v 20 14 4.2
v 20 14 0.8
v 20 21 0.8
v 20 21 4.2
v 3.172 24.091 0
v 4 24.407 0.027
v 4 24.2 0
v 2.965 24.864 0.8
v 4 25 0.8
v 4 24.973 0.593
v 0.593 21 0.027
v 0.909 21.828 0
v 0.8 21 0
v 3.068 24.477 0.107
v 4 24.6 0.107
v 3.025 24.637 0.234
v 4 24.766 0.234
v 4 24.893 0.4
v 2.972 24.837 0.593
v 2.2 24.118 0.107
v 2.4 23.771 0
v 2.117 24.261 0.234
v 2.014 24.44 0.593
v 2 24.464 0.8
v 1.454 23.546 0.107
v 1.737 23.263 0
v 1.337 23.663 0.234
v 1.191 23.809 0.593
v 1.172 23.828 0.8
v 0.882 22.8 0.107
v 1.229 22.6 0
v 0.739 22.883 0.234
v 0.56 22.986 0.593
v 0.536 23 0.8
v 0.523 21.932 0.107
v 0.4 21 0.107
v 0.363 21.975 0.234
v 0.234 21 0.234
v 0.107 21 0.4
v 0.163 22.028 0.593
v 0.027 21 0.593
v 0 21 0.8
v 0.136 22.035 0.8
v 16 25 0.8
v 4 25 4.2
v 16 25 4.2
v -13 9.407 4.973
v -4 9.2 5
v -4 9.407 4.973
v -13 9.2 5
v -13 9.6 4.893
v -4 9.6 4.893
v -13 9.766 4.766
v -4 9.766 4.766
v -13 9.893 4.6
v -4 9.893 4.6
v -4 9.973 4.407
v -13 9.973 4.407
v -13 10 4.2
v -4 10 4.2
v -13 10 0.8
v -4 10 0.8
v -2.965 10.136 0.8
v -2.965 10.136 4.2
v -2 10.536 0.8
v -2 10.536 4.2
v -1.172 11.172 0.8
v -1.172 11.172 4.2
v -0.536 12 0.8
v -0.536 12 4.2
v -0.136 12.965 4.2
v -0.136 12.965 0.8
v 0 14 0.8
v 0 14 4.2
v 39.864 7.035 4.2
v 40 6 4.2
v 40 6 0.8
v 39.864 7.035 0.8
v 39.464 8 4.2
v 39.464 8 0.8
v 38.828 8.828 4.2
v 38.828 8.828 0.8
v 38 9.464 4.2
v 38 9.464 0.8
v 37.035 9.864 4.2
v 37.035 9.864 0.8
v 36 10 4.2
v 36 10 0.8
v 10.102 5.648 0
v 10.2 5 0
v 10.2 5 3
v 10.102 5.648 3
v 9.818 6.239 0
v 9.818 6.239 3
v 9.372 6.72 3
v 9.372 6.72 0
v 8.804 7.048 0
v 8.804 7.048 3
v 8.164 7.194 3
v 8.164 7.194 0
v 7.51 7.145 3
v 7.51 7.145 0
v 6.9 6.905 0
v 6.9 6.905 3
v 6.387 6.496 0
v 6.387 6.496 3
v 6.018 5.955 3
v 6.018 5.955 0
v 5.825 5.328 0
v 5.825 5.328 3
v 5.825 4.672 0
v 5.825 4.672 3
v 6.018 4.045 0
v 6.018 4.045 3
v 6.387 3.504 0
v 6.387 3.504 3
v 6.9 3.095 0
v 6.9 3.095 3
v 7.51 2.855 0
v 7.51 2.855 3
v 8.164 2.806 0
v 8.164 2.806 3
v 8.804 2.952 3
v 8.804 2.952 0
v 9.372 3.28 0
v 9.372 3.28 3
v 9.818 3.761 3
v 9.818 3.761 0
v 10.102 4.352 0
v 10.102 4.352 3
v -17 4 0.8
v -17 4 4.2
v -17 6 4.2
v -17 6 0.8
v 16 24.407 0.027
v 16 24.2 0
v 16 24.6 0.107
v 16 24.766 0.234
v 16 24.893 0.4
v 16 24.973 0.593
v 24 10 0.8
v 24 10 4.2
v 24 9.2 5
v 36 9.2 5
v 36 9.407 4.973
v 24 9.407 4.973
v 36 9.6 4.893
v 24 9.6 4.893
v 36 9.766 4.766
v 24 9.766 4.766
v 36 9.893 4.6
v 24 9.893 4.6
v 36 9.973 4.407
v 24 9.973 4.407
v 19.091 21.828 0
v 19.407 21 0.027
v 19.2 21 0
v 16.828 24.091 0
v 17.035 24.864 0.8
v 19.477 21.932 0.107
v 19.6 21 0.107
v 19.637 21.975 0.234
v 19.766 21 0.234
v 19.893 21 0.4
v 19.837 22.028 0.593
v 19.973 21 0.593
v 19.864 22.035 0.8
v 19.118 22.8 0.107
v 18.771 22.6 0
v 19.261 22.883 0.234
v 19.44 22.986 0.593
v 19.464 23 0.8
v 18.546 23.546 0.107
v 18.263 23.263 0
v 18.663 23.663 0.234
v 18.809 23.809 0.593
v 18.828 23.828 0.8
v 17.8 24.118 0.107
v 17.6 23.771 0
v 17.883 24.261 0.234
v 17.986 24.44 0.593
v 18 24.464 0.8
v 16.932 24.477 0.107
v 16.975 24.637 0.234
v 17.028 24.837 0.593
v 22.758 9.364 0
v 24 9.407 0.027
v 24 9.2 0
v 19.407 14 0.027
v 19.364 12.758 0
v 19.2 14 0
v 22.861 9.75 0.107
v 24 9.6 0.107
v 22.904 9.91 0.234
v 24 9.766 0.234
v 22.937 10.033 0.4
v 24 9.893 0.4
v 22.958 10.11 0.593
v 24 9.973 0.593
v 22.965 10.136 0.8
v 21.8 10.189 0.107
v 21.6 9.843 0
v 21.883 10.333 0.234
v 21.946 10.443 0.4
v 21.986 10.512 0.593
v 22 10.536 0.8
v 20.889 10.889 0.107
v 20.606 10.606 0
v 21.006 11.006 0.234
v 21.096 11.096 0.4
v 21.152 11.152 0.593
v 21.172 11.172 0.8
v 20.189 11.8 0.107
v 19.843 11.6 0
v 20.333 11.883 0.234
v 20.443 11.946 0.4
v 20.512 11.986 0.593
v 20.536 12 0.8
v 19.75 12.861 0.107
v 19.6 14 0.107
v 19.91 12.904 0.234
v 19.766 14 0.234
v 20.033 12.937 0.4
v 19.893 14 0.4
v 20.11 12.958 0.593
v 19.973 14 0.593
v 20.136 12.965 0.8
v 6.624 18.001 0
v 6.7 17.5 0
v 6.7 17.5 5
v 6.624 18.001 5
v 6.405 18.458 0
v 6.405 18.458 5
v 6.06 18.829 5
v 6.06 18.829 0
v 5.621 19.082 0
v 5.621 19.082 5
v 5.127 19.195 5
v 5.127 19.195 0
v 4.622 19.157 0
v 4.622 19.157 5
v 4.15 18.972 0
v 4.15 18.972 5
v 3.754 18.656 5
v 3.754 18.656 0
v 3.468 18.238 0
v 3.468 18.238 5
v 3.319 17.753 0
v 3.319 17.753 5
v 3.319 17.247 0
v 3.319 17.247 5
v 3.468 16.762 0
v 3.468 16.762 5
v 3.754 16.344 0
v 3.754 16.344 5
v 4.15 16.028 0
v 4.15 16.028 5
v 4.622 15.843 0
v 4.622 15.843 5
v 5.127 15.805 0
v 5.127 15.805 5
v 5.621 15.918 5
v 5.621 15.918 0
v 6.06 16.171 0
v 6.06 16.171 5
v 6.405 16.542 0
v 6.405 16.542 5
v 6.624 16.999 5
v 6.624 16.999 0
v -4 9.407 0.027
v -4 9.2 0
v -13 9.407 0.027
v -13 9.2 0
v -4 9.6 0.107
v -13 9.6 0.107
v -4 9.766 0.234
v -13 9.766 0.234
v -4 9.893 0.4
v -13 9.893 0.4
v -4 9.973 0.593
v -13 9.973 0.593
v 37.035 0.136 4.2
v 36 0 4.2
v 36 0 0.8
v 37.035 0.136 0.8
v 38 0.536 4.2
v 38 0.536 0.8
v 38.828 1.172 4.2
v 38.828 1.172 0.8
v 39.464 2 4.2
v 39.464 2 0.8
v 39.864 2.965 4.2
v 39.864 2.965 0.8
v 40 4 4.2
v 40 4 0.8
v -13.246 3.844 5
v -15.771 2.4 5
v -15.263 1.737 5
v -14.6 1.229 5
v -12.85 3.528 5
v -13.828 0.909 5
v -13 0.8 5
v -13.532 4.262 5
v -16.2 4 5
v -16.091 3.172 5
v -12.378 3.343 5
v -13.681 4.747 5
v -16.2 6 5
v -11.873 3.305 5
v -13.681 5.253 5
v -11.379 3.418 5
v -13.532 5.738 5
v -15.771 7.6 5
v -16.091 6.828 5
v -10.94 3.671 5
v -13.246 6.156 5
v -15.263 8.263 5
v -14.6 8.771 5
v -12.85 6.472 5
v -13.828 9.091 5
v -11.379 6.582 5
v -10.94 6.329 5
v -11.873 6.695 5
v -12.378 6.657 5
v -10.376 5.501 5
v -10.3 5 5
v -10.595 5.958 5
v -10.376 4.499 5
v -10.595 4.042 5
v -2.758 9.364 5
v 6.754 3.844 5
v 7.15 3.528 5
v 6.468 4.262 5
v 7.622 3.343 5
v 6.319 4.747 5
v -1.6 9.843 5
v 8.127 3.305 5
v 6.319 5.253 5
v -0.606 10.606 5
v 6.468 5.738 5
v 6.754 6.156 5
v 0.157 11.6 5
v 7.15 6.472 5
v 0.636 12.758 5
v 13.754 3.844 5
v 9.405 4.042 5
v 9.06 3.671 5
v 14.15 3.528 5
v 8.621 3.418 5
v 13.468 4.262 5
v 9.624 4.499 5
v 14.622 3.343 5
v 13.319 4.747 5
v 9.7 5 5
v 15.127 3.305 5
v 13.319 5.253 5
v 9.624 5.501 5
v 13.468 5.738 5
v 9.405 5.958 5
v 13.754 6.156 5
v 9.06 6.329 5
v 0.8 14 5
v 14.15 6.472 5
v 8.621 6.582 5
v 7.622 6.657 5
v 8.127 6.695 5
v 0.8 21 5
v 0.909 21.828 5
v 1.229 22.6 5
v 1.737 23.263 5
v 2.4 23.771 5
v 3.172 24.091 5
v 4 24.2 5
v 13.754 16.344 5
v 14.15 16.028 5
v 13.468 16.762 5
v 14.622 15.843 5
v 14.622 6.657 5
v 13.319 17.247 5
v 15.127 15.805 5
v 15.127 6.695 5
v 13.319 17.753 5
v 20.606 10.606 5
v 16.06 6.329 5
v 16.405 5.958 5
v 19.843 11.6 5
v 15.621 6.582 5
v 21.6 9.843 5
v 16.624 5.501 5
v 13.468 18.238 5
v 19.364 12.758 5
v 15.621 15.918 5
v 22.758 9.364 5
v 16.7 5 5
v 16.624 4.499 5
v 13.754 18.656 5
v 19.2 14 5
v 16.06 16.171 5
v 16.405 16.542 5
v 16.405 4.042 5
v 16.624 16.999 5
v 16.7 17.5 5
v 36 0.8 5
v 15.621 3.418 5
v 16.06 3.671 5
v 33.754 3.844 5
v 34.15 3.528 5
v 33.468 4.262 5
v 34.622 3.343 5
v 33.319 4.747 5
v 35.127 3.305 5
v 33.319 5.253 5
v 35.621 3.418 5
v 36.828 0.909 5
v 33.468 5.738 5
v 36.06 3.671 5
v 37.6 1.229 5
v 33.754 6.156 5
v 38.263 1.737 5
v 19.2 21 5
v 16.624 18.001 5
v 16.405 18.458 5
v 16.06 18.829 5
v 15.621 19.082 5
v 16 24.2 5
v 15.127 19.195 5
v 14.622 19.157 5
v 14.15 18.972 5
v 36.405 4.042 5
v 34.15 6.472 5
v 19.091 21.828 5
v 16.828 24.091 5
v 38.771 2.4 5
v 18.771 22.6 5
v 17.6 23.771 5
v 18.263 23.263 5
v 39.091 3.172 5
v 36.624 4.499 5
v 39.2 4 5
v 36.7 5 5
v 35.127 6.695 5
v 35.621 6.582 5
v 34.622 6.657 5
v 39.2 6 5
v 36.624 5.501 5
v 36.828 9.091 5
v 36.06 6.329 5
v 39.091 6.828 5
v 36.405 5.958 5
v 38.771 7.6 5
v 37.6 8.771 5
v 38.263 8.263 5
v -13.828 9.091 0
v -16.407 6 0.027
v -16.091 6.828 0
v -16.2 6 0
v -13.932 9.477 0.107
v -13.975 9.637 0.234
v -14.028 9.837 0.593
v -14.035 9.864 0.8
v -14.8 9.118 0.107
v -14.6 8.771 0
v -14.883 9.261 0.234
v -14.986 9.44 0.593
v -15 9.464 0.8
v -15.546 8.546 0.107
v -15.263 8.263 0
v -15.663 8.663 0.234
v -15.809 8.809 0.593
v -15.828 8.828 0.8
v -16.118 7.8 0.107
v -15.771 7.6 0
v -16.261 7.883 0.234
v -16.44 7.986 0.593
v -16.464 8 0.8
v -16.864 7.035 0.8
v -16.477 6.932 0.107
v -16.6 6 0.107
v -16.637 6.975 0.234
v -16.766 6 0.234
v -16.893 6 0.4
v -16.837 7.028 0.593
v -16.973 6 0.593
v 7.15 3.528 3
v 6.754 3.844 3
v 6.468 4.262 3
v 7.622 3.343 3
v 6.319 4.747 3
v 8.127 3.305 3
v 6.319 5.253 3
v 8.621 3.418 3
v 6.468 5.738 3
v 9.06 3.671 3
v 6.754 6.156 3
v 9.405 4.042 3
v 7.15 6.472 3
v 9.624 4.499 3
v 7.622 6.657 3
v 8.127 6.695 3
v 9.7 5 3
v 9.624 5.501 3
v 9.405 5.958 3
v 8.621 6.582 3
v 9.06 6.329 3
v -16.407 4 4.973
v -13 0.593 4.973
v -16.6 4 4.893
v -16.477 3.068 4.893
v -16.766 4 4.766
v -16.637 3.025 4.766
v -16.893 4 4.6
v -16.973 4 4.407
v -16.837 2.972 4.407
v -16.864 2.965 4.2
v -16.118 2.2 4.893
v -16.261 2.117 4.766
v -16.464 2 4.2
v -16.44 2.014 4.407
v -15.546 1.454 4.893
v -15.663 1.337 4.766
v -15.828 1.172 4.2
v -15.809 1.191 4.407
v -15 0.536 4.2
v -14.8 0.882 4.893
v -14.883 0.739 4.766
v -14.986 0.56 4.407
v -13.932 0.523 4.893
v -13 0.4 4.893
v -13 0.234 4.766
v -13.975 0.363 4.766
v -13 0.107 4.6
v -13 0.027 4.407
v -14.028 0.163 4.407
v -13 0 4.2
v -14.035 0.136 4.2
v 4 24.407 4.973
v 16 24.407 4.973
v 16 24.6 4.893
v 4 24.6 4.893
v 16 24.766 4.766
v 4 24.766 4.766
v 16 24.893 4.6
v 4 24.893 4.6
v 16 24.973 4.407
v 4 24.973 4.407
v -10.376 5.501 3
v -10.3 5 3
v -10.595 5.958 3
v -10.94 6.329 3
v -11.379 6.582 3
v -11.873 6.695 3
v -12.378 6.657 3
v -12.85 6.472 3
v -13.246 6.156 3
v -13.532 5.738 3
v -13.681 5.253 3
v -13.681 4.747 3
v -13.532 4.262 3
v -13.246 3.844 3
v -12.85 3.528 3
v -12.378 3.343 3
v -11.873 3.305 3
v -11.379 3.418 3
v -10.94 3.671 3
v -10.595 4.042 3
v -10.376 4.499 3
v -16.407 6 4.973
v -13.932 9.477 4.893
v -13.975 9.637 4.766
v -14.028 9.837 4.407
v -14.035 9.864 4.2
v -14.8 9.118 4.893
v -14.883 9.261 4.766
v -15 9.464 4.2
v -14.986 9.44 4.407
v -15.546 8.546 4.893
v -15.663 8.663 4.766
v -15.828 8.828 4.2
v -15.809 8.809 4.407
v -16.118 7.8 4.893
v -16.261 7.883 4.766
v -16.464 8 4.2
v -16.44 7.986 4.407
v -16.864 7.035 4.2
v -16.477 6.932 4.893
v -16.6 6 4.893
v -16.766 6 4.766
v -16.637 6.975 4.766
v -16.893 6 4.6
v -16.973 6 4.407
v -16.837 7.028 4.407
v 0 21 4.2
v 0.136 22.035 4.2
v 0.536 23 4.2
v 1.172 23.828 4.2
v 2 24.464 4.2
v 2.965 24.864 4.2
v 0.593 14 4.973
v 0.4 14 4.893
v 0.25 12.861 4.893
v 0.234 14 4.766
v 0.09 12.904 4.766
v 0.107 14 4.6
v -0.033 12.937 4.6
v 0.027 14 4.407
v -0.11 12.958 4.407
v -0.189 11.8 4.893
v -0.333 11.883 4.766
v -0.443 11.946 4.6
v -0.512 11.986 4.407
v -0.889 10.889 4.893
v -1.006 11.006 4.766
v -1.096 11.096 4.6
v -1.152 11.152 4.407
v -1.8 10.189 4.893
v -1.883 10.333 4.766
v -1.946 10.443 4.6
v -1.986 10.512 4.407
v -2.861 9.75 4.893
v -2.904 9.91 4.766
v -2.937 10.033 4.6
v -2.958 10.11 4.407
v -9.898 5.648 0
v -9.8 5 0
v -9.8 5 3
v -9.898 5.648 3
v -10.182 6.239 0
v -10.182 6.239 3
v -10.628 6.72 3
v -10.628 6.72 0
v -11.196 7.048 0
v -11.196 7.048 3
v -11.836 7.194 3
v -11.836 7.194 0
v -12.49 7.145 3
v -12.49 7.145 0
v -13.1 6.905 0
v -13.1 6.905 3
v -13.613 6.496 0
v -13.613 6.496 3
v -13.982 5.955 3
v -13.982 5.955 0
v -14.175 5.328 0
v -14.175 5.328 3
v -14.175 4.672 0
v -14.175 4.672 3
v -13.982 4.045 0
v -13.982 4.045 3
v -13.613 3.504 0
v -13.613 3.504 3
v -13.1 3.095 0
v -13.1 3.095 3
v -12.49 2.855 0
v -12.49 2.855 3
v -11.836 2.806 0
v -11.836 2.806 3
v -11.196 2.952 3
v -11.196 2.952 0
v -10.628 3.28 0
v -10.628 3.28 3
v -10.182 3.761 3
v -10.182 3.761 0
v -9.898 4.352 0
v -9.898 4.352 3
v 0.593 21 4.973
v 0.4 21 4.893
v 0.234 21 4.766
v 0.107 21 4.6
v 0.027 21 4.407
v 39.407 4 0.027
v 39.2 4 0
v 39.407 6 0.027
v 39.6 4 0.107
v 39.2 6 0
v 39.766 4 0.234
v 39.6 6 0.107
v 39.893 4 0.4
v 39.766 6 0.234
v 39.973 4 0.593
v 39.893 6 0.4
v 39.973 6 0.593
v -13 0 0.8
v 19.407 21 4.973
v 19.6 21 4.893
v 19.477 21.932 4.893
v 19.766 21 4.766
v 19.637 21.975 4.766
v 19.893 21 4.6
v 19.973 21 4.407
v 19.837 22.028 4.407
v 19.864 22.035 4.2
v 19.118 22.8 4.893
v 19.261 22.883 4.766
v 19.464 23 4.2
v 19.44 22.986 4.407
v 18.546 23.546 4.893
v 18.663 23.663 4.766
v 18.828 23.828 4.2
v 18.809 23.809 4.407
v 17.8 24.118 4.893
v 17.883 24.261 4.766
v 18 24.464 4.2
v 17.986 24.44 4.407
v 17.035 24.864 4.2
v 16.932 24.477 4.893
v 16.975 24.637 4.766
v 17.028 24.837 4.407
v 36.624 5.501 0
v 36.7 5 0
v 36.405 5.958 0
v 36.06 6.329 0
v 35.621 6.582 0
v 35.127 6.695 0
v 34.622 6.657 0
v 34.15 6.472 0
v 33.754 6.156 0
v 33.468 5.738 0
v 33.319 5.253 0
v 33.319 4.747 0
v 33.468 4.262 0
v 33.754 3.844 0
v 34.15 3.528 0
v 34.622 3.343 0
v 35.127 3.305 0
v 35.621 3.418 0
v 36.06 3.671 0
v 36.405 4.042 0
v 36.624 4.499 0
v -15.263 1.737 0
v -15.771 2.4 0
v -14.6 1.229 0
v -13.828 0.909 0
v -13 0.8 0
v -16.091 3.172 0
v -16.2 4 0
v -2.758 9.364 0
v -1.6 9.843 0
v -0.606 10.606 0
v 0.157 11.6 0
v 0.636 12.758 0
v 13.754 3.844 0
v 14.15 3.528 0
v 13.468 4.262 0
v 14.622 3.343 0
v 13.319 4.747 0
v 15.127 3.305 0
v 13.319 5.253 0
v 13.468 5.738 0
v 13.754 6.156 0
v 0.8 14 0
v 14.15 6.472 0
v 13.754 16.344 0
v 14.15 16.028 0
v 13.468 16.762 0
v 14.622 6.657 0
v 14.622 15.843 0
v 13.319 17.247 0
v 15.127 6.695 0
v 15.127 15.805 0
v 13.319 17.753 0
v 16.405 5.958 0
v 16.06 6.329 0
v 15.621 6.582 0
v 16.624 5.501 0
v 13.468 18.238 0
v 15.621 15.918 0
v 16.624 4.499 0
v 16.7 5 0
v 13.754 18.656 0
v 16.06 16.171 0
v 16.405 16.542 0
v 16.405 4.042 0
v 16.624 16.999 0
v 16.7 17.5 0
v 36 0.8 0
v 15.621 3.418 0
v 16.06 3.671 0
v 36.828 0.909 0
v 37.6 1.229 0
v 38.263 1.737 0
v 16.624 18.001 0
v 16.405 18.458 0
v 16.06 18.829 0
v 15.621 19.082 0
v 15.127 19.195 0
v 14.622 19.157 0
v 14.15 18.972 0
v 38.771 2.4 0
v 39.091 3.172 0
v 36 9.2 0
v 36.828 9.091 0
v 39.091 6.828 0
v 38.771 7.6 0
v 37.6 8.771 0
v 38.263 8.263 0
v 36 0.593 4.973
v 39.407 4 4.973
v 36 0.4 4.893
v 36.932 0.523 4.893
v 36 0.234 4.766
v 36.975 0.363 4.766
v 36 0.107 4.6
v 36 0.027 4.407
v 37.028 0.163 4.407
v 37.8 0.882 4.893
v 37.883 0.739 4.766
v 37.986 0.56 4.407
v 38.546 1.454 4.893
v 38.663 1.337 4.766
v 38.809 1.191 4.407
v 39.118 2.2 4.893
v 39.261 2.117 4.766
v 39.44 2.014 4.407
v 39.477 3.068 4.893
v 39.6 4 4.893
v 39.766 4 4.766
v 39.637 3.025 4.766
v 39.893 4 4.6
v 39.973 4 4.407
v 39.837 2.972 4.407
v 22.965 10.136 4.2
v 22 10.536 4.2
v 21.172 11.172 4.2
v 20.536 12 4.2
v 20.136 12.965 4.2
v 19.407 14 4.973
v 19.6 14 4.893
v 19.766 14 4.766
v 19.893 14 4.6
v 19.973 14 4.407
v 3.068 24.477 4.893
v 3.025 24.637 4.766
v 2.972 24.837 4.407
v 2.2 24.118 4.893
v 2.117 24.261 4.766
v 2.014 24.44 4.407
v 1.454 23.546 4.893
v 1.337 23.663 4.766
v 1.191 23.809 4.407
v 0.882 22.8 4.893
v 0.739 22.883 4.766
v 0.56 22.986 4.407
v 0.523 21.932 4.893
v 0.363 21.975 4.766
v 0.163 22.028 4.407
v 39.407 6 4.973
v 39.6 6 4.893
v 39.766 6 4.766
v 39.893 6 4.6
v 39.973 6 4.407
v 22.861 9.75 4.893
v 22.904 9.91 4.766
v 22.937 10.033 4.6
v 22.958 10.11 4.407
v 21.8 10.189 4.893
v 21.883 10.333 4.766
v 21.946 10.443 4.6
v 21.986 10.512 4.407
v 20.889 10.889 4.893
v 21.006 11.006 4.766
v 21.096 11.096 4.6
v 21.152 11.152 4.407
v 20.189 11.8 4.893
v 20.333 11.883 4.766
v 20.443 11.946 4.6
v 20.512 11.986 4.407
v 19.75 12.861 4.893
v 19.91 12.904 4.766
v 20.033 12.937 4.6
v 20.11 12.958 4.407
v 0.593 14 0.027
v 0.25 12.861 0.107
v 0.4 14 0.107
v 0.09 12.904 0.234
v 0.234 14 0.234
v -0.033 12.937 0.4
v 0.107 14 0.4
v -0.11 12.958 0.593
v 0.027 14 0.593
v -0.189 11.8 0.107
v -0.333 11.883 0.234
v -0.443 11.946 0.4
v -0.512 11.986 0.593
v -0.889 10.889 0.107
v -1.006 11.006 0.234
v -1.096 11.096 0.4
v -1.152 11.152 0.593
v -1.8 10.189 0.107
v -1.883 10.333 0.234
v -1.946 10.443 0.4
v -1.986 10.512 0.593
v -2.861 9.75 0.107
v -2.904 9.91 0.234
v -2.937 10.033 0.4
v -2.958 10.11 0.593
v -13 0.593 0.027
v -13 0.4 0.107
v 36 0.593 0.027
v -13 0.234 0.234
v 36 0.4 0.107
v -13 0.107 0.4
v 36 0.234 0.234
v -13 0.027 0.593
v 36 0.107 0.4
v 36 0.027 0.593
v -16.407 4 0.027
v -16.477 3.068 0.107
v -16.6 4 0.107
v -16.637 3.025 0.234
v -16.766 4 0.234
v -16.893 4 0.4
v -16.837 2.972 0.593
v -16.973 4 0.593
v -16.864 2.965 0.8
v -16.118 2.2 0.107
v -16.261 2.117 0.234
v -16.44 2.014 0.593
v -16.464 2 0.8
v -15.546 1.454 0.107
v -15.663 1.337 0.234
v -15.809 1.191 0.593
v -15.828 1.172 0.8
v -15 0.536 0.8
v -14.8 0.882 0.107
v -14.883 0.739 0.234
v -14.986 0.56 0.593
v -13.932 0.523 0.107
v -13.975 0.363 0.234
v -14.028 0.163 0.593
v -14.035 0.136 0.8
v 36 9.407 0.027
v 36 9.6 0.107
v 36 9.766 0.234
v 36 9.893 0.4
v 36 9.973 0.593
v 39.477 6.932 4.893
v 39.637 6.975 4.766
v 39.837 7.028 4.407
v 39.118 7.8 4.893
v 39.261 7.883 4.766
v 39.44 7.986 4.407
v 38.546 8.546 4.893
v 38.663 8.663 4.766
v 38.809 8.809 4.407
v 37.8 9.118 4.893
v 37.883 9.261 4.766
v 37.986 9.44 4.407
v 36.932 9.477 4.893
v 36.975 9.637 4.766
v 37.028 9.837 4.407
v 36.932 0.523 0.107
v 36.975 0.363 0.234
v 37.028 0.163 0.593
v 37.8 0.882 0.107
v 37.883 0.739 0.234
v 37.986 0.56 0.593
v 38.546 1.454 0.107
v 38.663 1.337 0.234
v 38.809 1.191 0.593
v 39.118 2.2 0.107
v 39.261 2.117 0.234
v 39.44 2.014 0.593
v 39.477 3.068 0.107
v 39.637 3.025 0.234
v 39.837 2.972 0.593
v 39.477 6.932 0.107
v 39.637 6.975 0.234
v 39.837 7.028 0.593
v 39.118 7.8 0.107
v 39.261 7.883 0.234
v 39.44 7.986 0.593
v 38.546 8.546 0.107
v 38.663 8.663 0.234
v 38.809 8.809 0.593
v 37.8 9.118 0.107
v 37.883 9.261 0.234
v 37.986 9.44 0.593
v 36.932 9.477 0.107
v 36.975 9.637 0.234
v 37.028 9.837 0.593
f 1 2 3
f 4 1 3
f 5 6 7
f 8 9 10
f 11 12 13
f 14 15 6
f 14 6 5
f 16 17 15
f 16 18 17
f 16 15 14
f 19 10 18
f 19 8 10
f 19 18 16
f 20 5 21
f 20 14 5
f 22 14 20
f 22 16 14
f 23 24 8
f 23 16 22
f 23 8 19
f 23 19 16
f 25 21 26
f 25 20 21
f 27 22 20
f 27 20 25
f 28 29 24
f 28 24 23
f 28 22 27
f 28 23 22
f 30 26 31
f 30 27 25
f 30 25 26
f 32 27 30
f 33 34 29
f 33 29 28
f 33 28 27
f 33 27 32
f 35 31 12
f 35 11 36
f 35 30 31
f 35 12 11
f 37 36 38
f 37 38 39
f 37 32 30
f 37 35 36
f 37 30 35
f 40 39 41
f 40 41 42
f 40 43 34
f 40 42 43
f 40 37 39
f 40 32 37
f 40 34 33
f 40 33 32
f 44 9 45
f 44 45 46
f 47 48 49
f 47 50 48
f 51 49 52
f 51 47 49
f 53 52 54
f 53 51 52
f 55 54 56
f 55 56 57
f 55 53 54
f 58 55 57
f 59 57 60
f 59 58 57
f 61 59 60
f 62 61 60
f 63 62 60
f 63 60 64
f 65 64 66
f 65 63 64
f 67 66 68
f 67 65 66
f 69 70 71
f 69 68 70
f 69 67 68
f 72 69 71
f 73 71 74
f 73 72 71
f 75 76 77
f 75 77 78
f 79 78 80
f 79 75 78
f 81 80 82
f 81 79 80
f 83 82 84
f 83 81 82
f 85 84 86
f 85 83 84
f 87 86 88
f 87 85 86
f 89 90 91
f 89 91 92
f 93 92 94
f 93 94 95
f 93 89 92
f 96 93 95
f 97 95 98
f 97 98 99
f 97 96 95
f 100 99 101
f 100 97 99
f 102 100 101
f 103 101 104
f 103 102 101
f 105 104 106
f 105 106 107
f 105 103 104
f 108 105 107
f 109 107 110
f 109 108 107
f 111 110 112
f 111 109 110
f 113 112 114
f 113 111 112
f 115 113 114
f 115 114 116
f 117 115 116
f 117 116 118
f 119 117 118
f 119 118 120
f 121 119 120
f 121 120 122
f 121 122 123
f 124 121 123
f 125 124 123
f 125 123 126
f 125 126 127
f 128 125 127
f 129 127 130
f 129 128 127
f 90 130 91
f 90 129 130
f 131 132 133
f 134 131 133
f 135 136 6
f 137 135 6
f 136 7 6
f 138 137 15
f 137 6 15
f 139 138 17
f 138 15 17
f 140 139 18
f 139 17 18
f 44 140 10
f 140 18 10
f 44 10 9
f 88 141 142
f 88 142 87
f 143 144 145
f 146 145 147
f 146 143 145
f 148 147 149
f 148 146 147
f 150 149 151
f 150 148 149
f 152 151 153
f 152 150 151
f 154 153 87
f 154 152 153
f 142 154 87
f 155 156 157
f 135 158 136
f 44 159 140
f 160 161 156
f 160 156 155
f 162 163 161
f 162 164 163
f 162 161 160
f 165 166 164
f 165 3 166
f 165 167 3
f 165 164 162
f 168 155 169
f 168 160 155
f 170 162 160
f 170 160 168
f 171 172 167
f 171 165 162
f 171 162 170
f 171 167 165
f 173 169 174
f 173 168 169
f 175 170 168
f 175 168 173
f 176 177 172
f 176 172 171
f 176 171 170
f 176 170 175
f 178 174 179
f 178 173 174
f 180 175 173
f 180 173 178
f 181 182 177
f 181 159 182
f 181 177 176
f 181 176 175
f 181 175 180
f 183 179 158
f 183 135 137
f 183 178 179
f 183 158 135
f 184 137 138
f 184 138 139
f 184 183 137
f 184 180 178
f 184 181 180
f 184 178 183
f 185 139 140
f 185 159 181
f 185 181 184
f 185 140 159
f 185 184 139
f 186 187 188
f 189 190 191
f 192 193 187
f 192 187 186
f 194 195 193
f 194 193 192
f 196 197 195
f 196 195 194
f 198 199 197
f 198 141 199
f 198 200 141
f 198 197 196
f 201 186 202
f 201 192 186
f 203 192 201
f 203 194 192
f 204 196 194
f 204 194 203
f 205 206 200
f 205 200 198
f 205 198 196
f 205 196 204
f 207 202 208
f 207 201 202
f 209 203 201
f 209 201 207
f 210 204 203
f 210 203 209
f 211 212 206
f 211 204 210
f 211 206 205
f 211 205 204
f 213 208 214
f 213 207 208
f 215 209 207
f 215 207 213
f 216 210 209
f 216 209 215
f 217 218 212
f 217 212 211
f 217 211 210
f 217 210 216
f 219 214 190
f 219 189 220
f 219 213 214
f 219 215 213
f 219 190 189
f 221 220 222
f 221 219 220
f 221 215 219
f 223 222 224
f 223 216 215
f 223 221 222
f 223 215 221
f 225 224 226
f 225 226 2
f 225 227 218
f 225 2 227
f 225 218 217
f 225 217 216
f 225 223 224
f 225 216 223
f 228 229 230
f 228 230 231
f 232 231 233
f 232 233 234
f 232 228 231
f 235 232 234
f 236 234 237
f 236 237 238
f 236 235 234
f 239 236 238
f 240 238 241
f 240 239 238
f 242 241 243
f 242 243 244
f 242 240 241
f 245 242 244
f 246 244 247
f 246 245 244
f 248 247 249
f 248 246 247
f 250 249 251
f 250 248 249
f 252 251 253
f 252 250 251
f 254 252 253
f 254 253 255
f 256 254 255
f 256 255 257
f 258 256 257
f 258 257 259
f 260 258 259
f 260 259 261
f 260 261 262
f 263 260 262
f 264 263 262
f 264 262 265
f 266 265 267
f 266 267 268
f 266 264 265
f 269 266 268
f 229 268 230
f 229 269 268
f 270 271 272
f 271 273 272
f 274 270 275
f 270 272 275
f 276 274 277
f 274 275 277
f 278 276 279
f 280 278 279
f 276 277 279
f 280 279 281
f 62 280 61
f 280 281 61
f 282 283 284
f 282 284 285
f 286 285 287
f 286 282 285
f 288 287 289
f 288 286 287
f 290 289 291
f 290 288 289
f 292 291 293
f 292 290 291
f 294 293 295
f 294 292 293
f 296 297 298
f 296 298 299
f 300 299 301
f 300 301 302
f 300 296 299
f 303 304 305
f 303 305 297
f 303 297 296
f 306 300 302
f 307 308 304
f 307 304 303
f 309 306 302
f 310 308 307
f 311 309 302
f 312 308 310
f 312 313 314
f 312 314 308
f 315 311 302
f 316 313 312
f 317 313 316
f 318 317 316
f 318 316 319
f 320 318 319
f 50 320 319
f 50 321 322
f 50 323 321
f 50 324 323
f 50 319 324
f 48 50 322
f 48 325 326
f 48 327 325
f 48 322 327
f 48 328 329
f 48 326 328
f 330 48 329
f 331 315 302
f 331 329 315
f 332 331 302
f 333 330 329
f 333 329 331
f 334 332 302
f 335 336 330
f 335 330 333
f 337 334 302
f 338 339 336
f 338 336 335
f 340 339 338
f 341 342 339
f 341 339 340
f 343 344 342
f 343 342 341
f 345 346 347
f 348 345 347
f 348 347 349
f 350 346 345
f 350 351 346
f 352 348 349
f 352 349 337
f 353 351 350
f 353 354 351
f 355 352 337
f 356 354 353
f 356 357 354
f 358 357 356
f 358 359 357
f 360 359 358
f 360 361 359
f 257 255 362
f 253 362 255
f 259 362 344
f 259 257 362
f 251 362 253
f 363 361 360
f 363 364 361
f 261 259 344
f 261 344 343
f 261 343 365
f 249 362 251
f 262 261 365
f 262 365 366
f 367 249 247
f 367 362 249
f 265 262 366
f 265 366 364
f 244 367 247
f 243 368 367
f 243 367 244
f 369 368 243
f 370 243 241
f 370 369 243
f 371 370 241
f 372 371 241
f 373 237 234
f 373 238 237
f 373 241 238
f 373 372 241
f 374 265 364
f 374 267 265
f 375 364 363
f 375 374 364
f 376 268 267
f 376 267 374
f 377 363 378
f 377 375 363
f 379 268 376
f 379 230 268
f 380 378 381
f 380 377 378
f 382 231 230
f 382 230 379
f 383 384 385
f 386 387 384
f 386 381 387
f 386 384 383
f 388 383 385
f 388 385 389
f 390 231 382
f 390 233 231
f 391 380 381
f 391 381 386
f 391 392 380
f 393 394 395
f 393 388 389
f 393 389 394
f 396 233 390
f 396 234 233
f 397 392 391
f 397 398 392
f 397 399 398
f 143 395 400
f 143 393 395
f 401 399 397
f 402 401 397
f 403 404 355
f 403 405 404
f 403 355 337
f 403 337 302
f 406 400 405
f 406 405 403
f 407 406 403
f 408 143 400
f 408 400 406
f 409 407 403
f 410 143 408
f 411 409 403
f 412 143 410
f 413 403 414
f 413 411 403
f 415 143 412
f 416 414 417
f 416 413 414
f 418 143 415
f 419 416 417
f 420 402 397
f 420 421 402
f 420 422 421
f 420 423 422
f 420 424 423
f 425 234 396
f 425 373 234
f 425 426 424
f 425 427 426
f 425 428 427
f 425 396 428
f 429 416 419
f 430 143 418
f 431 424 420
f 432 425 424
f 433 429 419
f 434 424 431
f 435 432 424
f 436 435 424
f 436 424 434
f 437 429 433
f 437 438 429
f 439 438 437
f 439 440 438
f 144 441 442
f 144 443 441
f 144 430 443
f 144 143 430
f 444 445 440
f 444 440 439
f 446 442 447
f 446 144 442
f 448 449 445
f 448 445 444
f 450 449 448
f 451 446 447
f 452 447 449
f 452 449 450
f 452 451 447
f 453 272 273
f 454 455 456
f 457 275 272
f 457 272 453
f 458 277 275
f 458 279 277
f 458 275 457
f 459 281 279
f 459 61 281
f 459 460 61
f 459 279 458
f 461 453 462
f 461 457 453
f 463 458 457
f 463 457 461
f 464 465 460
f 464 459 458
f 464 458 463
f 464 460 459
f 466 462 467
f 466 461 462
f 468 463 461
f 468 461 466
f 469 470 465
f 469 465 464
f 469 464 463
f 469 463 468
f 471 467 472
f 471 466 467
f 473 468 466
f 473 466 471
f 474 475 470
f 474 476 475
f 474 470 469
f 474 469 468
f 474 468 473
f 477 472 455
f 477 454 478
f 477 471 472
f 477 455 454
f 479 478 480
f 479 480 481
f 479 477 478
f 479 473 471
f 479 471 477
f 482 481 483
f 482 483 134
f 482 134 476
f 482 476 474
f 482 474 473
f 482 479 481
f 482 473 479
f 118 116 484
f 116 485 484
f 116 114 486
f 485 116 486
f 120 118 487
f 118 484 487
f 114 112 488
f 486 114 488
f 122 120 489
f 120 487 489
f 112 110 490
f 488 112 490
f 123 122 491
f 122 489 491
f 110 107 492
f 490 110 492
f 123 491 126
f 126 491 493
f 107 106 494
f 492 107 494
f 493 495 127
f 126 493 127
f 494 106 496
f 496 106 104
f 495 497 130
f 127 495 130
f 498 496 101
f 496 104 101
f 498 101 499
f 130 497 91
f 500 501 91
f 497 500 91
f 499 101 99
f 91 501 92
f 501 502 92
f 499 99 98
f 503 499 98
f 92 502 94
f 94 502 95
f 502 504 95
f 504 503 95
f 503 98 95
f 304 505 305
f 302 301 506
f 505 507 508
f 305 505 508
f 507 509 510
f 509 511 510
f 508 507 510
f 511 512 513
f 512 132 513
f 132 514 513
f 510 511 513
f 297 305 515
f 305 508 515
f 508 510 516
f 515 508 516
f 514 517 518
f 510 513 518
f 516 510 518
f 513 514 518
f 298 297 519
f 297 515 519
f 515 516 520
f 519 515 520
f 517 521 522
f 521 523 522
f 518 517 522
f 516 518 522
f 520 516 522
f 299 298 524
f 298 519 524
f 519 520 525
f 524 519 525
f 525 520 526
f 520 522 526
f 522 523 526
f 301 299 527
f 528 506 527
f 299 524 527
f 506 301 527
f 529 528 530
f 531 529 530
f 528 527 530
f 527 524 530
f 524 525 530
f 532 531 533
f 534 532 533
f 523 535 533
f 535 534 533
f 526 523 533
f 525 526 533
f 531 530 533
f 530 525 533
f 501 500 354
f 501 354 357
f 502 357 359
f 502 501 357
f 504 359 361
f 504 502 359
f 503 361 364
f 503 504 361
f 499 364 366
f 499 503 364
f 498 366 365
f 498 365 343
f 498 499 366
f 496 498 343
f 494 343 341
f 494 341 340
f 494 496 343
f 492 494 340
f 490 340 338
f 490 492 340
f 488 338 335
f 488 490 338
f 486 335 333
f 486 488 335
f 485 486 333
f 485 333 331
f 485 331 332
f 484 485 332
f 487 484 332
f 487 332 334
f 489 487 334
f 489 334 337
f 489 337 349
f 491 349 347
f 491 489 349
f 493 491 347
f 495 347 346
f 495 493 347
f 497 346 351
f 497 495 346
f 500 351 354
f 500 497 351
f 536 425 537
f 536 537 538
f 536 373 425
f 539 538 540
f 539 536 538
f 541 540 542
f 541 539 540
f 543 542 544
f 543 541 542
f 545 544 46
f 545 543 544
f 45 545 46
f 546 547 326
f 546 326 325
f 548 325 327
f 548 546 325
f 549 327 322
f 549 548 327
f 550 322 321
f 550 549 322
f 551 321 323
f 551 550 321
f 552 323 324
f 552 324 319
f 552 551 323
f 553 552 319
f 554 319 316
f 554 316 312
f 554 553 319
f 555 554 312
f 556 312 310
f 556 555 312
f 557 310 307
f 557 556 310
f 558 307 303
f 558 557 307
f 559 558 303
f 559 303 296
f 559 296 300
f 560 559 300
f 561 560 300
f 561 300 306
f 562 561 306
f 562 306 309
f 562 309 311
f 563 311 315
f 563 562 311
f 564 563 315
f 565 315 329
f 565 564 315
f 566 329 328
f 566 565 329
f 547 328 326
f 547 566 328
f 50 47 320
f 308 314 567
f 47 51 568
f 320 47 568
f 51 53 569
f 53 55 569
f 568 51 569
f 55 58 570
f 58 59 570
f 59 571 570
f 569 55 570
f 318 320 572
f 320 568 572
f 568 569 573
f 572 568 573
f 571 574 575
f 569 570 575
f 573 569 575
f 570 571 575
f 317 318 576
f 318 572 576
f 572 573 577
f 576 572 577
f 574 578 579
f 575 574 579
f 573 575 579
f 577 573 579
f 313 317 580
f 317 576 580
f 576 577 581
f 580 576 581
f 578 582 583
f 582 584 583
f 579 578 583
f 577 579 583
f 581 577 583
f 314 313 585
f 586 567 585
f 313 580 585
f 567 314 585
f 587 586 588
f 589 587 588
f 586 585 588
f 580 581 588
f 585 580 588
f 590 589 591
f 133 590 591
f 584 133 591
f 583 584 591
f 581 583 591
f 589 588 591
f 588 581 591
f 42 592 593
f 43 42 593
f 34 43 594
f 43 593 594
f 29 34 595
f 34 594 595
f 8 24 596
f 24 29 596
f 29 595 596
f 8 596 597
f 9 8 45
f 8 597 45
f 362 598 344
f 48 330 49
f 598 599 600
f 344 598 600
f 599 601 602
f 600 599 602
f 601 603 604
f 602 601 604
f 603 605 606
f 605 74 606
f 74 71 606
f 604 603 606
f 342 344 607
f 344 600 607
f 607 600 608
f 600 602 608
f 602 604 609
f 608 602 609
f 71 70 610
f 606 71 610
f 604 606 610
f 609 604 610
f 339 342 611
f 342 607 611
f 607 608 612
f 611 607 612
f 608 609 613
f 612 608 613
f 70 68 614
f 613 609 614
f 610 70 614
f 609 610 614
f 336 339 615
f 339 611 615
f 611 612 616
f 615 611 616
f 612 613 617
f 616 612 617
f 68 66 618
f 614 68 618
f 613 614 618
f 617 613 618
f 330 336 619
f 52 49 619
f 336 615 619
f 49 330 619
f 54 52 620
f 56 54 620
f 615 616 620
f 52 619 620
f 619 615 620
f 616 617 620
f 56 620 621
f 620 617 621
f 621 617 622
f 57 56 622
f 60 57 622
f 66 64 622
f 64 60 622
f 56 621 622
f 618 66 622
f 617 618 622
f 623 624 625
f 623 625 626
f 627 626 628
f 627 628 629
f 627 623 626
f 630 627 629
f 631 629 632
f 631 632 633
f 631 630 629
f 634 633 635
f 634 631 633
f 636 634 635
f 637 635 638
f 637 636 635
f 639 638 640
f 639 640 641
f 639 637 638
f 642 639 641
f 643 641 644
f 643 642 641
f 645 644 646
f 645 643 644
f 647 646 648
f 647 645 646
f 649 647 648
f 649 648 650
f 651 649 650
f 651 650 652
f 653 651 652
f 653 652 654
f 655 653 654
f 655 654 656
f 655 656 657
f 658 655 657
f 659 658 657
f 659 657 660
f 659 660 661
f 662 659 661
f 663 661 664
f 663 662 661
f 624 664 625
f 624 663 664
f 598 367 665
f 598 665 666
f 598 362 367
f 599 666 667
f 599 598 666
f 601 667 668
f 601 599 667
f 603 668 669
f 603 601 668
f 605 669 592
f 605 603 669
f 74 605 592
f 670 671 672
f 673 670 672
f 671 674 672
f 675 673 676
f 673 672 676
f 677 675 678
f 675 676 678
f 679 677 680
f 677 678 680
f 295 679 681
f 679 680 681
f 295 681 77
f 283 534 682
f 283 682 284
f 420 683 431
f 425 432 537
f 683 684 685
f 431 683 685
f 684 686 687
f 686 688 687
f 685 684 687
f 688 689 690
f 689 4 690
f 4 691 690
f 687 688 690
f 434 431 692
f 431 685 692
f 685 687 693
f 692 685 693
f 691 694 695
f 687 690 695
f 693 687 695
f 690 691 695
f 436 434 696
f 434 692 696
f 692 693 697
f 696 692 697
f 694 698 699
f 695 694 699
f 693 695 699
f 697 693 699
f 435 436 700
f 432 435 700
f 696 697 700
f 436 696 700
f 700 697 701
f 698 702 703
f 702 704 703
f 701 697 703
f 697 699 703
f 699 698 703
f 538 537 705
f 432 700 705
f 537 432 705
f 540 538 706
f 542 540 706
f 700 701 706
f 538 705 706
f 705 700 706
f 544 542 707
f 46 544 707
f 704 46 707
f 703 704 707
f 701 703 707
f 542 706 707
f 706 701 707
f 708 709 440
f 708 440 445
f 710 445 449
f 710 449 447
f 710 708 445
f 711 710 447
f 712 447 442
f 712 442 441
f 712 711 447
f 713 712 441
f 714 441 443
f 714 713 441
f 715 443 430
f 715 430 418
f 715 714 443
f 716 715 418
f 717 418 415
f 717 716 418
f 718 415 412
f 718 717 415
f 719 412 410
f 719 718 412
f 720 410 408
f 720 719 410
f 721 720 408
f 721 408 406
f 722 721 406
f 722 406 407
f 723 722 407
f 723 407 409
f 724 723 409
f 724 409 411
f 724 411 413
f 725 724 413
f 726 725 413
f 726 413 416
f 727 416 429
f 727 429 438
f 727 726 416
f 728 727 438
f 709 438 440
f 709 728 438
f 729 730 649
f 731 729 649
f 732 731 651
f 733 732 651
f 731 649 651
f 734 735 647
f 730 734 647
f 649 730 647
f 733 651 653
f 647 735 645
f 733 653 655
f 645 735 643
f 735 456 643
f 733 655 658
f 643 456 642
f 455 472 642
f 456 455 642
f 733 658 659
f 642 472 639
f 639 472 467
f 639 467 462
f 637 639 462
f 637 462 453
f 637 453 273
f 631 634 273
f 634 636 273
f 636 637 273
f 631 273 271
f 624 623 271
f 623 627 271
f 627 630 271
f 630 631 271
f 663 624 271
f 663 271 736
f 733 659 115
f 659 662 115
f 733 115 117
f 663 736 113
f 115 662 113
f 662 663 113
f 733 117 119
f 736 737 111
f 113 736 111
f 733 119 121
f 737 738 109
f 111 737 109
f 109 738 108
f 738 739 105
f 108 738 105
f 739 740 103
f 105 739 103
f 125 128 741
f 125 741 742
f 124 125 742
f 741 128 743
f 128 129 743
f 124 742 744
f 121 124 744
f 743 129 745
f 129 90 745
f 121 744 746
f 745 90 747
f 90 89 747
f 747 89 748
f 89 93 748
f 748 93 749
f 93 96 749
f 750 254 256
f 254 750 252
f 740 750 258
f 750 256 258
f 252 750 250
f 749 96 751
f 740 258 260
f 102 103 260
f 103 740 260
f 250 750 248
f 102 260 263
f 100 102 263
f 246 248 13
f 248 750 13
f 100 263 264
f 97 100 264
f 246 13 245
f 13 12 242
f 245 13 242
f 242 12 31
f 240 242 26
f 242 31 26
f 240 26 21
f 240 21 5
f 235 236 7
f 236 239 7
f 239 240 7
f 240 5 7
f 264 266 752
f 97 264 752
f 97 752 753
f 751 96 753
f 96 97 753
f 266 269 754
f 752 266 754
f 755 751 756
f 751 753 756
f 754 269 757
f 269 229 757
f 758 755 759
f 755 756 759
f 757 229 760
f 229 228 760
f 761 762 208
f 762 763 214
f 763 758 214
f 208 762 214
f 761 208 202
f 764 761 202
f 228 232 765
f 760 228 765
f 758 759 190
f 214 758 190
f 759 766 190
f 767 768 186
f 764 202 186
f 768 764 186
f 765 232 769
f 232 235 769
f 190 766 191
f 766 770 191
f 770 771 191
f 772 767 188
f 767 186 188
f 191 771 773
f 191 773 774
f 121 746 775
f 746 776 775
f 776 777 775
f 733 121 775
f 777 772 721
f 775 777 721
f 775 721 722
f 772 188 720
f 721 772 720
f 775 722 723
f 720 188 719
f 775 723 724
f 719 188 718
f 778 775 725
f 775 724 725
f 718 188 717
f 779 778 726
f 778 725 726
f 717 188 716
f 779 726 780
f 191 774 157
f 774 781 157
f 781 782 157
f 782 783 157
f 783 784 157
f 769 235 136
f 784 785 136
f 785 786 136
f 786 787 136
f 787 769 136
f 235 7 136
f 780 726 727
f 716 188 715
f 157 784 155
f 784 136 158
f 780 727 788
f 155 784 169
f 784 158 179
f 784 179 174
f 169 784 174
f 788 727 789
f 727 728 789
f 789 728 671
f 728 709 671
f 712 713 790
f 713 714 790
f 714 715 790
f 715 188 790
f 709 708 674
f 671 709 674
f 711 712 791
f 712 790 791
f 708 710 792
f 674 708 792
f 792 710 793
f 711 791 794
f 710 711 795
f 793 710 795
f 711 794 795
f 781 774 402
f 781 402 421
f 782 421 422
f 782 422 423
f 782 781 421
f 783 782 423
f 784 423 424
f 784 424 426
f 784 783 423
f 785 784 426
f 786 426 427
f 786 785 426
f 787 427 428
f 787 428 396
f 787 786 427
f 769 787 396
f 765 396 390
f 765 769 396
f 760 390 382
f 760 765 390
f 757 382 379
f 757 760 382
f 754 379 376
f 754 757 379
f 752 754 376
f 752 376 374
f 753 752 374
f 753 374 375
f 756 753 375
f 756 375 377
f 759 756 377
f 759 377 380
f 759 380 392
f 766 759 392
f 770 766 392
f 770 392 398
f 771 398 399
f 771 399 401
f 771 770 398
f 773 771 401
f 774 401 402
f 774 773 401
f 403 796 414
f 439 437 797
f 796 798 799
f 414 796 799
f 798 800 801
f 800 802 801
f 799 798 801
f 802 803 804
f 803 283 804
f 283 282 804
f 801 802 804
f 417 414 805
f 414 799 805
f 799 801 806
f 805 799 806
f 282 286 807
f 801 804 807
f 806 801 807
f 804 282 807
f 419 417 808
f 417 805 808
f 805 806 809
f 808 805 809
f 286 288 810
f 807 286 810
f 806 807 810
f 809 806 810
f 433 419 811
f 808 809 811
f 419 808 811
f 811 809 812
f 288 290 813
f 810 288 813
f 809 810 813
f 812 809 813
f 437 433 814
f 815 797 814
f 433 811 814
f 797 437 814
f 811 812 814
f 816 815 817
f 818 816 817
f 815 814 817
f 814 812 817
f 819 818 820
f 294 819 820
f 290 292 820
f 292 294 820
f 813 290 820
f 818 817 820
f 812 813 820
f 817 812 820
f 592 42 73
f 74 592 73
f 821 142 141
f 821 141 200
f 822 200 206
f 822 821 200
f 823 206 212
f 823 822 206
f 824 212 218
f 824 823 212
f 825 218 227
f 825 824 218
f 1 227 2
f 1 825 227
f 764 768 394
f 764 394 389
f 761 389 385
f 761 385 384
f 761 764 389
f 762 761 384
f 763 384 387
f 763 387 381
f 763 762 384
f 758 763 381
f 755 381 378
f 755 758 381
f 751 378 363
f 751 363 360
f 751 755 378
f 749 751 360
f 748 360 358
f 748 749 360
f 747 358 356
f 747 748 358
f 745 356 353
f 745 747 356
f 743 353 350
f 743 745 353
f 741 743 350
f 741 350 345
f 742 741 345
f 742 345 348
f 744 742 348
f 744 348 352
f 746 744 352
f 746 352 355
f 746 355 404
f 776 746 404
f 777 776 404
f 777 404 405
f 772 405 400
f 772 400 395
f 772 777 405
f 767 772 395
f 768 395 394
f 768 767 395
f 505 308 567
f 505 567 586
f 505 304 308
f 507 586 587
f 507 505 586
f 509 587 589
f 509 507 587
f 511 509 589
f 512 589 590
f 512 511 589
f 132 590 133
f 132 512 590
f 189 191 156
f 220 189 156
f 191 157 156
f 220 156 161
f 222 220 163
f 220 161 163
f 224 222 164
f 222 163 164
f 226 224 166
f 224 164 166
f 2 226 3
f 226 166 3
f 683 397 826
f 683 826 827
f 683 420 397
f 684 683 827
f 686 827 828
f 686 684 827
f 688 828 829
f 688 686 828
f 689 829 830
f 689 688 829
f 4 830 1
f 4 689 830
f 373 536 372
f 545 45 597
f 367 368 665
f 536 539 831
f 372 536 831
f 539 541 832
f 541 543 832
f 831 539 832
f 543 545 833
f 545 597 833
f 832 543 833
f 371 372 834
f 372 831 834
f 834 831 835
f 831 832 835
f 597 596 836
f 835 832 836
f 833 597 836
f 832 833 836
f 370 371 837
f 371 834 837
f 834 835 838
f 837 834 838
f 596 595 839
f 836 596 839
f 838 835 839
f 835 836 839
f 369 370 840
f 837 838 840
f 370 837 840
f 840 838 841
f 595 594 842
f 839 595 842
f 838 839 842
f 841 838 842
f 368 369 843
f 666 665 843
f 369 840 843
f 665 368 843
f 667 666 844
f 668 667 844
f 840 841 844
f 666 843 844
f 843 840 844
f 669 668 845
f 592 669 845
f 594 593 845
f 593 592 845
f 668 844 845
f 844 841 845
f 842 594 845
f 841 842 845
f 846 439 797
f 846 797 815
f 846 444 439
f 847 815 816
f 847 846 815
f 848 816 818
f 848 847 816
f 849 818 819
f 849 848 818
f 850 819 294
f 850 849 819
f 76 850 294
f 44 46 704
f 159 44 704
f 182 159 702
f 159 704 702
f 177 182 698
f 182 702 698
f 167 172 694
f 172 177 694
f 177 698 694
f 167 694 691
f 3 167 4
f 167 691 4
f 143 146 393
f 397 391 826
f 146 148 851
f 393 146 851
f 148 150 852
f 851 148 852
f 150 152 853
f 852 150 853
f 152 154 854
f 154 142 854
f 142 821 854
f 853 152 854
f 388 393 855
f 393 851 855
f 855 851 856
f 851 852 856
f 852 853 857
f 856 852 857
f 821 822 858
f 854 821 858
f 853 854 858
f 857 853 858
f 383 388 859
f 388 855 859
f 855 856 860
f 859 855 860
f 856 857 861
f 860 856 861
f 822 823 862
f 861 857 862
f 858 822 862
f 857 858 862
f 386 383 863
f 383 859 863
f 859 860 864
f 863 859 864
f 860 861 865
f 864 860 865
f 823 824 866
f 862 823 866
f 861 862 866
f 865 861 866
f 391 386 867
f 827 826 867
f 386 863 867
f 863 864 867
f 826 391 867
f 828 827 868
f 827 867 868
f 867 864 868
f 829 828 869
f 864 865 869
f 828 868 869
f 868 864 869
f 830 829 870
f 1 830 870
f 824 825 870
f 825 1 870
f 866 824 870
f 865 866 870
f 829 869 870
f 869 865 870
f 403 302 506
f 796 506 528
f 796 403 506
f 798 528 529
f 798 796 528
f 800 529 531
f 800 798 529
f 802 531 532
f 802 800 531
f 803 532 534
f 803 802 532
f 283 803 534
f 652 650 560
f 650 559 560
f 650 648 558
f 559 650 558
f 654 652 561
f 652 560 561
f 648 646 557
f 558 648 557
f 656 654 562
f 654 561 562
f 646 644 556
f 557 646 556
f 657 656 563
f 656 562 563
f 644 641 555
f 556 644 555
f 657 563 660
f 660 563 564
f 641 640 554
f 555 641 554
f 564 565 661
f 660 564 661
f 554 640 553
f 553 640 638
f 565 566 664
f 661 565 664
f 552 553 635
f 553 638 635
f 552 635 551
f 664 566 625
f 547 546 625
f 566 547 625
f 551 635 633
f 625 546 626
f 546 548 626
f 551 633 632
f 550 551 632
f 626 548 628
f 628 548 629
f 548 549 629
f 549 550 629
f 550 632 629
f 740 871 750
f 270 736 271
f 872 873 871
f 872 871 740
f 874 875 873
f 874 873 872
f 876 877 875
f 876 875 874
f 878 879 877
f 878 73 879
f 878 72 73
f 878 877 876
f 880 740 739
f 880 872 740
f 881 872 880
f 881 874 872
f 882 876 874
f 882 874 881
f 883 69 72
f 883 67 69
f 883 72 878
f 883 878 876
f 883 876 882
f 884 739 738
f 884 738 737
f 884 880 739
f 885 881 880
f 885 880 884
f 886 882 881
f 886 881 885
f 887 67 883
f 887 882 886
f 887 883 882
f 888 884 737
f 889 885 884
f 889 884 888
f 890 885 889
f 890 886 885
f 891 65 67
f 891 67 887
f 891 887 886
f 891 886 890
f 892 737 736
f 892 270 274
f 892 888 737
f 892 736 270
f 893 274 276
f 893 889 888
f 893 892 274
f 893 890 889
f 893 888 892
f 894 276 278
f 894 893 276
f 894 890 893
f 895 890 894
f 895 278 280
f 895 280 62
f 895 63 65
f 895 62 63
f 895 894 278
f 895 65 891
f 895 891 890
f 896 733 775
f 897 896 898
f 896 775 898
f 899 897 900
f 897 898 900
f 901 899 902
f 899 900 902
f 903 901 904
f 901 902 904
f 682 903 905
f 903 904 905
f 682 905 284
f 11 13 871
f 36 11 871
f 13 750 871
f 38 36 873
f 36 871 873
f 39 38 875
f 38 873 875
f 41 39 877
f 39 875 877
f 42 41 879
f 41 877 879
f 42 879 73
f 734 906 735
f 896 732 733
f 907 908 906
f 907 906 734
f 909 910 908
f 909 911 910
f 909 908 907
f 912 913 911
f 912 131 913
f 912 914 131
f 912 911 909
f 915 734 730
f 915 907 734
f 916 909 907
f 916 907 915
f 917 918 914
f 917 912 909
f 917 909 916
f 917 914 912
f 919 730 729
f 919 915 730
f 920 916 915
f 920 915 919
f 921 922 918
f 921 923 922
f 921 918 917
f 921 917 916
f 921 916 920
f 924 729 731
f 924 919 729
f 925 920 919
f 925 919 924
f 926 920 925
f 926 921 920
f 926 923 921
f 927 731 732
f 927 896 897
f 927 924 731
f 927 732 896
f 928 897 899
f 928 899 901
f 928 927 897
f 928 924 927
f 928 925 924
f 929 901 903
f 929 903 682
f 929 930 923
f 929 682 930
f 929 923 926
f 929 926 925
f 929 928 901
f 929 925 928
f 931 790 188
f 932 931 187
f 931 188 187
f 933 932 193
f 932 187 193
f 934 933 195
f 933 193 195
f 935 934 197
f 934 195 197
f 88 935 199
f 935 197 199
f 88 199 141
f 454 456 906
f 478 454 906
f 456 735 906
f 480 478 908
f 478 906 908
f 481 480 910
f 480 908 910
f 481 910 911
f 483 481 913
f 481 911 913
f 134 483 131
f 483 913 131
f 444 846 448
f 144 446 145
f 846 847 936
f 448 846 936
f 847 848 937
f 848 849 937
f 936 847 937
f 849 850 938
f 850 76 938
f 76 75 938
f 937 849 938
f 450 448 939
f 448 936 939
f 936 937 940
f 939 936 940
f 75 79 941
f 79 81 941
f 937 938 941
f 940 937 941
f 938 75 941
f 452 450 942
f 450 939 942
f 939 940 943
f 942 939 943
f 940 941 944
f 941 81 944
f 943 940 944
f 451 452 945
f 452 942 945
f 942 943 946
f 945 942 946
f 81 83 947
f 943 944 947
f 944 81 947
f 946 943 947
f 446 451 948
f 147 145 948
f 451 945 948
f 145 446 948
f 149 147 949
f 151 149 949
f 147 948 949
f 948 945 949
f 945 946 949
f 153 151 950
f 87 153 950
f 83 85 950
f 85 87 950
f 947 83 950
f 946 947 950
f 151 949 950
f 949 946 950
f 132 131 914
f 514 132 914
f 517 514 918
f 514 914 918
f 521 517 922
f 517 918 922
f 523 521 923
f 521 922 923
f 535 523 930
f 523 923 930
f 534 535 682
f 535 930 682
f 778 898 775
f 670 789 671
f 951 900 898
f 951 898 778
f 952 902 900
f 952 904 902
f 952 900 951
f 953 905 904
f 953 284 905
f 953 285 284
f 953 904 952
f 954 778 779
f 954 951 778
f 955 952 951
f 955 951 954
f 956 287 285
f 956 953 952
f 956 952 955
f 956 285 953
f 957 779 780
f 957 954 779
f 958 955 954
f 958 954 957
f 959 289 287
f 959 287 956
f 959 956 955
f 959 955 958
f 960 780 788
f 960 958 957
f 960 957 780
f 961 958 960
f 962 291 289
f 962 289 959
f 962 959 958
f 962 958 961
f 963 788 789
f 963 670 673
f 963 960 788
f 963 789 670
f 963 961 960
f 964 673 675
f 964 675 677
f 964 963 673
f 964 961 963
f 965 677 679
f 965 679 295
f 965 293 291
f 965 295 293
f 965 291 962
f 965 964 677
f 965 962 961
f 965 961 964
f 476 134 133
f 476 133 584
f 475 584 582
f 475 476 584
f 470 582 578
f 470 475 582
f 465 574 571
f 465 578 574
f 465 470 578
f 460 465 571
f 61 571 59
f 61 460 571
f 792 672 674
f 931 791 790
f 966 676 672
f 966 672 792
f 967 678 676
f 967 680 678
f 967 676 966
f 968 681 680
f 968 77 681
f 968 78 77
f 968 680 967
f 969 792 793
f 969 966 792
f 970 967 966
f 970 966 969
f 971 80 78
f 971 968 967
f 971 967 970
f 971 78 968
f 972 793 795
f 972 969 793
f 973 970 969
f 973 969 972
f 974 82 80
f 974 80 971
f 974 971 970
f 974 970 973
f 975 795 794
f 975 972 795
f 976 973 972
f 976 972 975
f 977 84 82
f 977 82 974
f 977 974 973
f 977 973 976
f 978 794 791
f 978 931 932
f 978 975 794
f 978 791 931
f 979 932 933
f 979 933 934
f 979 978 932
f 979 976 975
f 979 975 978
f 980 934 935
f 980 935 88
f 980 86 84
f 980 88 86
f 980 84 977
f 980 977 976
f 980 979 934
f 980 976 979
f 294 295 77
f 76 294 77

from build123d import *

# Parameters (mm, degrees)
SKETCH1_W                    = 20
SKETCH1_H                    = 15
SKETCH1_W_2                  = 40
SKETCH1_H_2                  = 10
BOSS_EXTRUDE1_DEPTH          = 5
M3_CLEARANCE_HOLE1_OUTLINE_R = 1.7
M3_CLEARANCE_HOLE1_DEPTH     = 5
SKETCH4_W                    = 17
SKETCH4_H                    = 10
BOSS_EXTRUDE2_DEPTH          = 5
HOLE1_OUTLINE_R              = 2.2
HOLE1_DEPTH                  = 3
HOLE1_START                  = 3
HOLE1_2_OUTLINE_R            = 1.7
HOLE1_2_DEPTH                = 2
FILLET1_R                    = 4
FILLET2_R                    = 0.8


# Read off the part's stored shape, not the designer's step: M3 Clearance Hole1, Hole1
with BuildPart() as part:
    # Sketch1 → Boss-Extrude1 (new body)
    with BuildSketch(Plane.XY):
        with Locations((10, 17.5)):
            Rectangle(SKETCH1_W, SKETCH1_H)
        with Locations((20, 5)):
            Rectangle(SKETCH1_W_2, SKETCH1_H_2)
    extrude(amount=BOSS_EXTRUDE1_DEPTH)

    # M3 Clearance Hole1 outline → M3 Clearance Hole1 (cut)
    with BuildSketch(Plane.XY):
        with Locations((5, 17.5)):
            Circle(M3_CLEARANCE_HOLE1_OUTLINE_R)
        with Locations((15, 17.5)):
            Circle(M3_CLEARANCE_HOLE1_OUTLINE_R)
        with Locations((15, 5)):
            Circle(M3_CLEARANCE_HOLE1_OUTLINE_R)
        with Locations((35, 5)):
            Circle(M3_CLEARANCE_HOLE1_OUTLINE_R)
    extrude(amount=M3_CLEARANCE_HOLE1_DEPTH, mode=Mode.SUBTRACT)

    # Sketch4 → Boss-Extrude2 (add)
    with BuildSketch(Plane.XY.offset(5)):
        with Locations((-8.5, 5)):
            Rectangle(SKETCH4_W, SKETCH4_H)
    extrude(amount=-BOSS_EXTRUDE2_DEPTH)

    # Hole1 outline → Hole1 (cut)
    with BuildSketch(Plane.XY):
        with Locations((8, 5)):
            Circle(HOLE1_OUTLINE_R)
        with Locations((-12, 5)):
            Circle(HOLE1_OUTLINE_R)
    extrude(amount=HOLE1_DEPTH, mode=Mode.SUBTRACT)

    # Hole1 2 outline → Hole1 2 (cut)
    with BuildSketch(Plane.XY.offset(HOLE1_START)):
        with Locations((8, 5)):
            Circle(HOLE1_2_OUTLINE_R)
        with Locations((-12, 5)):
            Circle(HOLE1_2_OUTLINE_R)
    extrude(amount=HOLE1_2_DEPTH, mode=Mode.SUBTRACT)

    # Fillet1
    fillet1_edges = [part.edges().sort_by_distance(p)[0] for p in [
        (0, 25, 2.5),
        (20, 25, 2.5),
        (20, 10, 2.5),
        (40, 10, 2.5),
        (40, 0, 2.5),
        (0, 10, 2.5),
        (-17, 0, 2.5),
        (-17, 10, 2.5),
    ]]
    fillet(fillet1_edges, radius=FILLET1_R)

    # Fillet2
    fillet2_edges = [part.edges().sort_by_distance(p)[0] for p in [
        (21.171572875, 11.171572875, 0),
        (21.171572875, 11.171572875, 5),
        (-1.171572875, 11.171572875, 5),
        (-1.171572875, 11.171572875, 0),
        (-17, 5, 0),
        (-17, 5, 5),
        (0, 17.5, 5),
        (-8.5, 10, 5),
        (11.5, 0, 5),
        (40, 5, 5),
        (30, 10, 5),
        (20, 17.5, 5),
        (10, 25, 5),
        (1.171572875, 23.828427125, 5),
        (18.828427125, 23.828427125, 5),
        (38.828427125, 8.828427125, 5),
        (38.828427125, 1.171572875, 5),
        (-15.828427125, 8.828427125, 5),
        (-15.828427125, 1.171572875, 5),
        (11.5, 0, 0),
        (-8.5, 10, 0),
        (0, 17.5, 0),
        (10, 25, 0),
        (20, 17.5, 0),
        (30, 10, 0),
        (40, 5, 0),
        (1.171572875, 23.828427125, 0),
        (18.828427125, 23.828427125, 0),
        (38.828427125, 8.828427125, 0),
        (38.828427125, 1.171572875, 0),
        (-15.828427125, 8.828427125, 0),
        (-15.828427125, 1.171572875, 0),
    ]]
    fillet(fillet2_edges, radius=FILLET2_R)


solid = part.part
